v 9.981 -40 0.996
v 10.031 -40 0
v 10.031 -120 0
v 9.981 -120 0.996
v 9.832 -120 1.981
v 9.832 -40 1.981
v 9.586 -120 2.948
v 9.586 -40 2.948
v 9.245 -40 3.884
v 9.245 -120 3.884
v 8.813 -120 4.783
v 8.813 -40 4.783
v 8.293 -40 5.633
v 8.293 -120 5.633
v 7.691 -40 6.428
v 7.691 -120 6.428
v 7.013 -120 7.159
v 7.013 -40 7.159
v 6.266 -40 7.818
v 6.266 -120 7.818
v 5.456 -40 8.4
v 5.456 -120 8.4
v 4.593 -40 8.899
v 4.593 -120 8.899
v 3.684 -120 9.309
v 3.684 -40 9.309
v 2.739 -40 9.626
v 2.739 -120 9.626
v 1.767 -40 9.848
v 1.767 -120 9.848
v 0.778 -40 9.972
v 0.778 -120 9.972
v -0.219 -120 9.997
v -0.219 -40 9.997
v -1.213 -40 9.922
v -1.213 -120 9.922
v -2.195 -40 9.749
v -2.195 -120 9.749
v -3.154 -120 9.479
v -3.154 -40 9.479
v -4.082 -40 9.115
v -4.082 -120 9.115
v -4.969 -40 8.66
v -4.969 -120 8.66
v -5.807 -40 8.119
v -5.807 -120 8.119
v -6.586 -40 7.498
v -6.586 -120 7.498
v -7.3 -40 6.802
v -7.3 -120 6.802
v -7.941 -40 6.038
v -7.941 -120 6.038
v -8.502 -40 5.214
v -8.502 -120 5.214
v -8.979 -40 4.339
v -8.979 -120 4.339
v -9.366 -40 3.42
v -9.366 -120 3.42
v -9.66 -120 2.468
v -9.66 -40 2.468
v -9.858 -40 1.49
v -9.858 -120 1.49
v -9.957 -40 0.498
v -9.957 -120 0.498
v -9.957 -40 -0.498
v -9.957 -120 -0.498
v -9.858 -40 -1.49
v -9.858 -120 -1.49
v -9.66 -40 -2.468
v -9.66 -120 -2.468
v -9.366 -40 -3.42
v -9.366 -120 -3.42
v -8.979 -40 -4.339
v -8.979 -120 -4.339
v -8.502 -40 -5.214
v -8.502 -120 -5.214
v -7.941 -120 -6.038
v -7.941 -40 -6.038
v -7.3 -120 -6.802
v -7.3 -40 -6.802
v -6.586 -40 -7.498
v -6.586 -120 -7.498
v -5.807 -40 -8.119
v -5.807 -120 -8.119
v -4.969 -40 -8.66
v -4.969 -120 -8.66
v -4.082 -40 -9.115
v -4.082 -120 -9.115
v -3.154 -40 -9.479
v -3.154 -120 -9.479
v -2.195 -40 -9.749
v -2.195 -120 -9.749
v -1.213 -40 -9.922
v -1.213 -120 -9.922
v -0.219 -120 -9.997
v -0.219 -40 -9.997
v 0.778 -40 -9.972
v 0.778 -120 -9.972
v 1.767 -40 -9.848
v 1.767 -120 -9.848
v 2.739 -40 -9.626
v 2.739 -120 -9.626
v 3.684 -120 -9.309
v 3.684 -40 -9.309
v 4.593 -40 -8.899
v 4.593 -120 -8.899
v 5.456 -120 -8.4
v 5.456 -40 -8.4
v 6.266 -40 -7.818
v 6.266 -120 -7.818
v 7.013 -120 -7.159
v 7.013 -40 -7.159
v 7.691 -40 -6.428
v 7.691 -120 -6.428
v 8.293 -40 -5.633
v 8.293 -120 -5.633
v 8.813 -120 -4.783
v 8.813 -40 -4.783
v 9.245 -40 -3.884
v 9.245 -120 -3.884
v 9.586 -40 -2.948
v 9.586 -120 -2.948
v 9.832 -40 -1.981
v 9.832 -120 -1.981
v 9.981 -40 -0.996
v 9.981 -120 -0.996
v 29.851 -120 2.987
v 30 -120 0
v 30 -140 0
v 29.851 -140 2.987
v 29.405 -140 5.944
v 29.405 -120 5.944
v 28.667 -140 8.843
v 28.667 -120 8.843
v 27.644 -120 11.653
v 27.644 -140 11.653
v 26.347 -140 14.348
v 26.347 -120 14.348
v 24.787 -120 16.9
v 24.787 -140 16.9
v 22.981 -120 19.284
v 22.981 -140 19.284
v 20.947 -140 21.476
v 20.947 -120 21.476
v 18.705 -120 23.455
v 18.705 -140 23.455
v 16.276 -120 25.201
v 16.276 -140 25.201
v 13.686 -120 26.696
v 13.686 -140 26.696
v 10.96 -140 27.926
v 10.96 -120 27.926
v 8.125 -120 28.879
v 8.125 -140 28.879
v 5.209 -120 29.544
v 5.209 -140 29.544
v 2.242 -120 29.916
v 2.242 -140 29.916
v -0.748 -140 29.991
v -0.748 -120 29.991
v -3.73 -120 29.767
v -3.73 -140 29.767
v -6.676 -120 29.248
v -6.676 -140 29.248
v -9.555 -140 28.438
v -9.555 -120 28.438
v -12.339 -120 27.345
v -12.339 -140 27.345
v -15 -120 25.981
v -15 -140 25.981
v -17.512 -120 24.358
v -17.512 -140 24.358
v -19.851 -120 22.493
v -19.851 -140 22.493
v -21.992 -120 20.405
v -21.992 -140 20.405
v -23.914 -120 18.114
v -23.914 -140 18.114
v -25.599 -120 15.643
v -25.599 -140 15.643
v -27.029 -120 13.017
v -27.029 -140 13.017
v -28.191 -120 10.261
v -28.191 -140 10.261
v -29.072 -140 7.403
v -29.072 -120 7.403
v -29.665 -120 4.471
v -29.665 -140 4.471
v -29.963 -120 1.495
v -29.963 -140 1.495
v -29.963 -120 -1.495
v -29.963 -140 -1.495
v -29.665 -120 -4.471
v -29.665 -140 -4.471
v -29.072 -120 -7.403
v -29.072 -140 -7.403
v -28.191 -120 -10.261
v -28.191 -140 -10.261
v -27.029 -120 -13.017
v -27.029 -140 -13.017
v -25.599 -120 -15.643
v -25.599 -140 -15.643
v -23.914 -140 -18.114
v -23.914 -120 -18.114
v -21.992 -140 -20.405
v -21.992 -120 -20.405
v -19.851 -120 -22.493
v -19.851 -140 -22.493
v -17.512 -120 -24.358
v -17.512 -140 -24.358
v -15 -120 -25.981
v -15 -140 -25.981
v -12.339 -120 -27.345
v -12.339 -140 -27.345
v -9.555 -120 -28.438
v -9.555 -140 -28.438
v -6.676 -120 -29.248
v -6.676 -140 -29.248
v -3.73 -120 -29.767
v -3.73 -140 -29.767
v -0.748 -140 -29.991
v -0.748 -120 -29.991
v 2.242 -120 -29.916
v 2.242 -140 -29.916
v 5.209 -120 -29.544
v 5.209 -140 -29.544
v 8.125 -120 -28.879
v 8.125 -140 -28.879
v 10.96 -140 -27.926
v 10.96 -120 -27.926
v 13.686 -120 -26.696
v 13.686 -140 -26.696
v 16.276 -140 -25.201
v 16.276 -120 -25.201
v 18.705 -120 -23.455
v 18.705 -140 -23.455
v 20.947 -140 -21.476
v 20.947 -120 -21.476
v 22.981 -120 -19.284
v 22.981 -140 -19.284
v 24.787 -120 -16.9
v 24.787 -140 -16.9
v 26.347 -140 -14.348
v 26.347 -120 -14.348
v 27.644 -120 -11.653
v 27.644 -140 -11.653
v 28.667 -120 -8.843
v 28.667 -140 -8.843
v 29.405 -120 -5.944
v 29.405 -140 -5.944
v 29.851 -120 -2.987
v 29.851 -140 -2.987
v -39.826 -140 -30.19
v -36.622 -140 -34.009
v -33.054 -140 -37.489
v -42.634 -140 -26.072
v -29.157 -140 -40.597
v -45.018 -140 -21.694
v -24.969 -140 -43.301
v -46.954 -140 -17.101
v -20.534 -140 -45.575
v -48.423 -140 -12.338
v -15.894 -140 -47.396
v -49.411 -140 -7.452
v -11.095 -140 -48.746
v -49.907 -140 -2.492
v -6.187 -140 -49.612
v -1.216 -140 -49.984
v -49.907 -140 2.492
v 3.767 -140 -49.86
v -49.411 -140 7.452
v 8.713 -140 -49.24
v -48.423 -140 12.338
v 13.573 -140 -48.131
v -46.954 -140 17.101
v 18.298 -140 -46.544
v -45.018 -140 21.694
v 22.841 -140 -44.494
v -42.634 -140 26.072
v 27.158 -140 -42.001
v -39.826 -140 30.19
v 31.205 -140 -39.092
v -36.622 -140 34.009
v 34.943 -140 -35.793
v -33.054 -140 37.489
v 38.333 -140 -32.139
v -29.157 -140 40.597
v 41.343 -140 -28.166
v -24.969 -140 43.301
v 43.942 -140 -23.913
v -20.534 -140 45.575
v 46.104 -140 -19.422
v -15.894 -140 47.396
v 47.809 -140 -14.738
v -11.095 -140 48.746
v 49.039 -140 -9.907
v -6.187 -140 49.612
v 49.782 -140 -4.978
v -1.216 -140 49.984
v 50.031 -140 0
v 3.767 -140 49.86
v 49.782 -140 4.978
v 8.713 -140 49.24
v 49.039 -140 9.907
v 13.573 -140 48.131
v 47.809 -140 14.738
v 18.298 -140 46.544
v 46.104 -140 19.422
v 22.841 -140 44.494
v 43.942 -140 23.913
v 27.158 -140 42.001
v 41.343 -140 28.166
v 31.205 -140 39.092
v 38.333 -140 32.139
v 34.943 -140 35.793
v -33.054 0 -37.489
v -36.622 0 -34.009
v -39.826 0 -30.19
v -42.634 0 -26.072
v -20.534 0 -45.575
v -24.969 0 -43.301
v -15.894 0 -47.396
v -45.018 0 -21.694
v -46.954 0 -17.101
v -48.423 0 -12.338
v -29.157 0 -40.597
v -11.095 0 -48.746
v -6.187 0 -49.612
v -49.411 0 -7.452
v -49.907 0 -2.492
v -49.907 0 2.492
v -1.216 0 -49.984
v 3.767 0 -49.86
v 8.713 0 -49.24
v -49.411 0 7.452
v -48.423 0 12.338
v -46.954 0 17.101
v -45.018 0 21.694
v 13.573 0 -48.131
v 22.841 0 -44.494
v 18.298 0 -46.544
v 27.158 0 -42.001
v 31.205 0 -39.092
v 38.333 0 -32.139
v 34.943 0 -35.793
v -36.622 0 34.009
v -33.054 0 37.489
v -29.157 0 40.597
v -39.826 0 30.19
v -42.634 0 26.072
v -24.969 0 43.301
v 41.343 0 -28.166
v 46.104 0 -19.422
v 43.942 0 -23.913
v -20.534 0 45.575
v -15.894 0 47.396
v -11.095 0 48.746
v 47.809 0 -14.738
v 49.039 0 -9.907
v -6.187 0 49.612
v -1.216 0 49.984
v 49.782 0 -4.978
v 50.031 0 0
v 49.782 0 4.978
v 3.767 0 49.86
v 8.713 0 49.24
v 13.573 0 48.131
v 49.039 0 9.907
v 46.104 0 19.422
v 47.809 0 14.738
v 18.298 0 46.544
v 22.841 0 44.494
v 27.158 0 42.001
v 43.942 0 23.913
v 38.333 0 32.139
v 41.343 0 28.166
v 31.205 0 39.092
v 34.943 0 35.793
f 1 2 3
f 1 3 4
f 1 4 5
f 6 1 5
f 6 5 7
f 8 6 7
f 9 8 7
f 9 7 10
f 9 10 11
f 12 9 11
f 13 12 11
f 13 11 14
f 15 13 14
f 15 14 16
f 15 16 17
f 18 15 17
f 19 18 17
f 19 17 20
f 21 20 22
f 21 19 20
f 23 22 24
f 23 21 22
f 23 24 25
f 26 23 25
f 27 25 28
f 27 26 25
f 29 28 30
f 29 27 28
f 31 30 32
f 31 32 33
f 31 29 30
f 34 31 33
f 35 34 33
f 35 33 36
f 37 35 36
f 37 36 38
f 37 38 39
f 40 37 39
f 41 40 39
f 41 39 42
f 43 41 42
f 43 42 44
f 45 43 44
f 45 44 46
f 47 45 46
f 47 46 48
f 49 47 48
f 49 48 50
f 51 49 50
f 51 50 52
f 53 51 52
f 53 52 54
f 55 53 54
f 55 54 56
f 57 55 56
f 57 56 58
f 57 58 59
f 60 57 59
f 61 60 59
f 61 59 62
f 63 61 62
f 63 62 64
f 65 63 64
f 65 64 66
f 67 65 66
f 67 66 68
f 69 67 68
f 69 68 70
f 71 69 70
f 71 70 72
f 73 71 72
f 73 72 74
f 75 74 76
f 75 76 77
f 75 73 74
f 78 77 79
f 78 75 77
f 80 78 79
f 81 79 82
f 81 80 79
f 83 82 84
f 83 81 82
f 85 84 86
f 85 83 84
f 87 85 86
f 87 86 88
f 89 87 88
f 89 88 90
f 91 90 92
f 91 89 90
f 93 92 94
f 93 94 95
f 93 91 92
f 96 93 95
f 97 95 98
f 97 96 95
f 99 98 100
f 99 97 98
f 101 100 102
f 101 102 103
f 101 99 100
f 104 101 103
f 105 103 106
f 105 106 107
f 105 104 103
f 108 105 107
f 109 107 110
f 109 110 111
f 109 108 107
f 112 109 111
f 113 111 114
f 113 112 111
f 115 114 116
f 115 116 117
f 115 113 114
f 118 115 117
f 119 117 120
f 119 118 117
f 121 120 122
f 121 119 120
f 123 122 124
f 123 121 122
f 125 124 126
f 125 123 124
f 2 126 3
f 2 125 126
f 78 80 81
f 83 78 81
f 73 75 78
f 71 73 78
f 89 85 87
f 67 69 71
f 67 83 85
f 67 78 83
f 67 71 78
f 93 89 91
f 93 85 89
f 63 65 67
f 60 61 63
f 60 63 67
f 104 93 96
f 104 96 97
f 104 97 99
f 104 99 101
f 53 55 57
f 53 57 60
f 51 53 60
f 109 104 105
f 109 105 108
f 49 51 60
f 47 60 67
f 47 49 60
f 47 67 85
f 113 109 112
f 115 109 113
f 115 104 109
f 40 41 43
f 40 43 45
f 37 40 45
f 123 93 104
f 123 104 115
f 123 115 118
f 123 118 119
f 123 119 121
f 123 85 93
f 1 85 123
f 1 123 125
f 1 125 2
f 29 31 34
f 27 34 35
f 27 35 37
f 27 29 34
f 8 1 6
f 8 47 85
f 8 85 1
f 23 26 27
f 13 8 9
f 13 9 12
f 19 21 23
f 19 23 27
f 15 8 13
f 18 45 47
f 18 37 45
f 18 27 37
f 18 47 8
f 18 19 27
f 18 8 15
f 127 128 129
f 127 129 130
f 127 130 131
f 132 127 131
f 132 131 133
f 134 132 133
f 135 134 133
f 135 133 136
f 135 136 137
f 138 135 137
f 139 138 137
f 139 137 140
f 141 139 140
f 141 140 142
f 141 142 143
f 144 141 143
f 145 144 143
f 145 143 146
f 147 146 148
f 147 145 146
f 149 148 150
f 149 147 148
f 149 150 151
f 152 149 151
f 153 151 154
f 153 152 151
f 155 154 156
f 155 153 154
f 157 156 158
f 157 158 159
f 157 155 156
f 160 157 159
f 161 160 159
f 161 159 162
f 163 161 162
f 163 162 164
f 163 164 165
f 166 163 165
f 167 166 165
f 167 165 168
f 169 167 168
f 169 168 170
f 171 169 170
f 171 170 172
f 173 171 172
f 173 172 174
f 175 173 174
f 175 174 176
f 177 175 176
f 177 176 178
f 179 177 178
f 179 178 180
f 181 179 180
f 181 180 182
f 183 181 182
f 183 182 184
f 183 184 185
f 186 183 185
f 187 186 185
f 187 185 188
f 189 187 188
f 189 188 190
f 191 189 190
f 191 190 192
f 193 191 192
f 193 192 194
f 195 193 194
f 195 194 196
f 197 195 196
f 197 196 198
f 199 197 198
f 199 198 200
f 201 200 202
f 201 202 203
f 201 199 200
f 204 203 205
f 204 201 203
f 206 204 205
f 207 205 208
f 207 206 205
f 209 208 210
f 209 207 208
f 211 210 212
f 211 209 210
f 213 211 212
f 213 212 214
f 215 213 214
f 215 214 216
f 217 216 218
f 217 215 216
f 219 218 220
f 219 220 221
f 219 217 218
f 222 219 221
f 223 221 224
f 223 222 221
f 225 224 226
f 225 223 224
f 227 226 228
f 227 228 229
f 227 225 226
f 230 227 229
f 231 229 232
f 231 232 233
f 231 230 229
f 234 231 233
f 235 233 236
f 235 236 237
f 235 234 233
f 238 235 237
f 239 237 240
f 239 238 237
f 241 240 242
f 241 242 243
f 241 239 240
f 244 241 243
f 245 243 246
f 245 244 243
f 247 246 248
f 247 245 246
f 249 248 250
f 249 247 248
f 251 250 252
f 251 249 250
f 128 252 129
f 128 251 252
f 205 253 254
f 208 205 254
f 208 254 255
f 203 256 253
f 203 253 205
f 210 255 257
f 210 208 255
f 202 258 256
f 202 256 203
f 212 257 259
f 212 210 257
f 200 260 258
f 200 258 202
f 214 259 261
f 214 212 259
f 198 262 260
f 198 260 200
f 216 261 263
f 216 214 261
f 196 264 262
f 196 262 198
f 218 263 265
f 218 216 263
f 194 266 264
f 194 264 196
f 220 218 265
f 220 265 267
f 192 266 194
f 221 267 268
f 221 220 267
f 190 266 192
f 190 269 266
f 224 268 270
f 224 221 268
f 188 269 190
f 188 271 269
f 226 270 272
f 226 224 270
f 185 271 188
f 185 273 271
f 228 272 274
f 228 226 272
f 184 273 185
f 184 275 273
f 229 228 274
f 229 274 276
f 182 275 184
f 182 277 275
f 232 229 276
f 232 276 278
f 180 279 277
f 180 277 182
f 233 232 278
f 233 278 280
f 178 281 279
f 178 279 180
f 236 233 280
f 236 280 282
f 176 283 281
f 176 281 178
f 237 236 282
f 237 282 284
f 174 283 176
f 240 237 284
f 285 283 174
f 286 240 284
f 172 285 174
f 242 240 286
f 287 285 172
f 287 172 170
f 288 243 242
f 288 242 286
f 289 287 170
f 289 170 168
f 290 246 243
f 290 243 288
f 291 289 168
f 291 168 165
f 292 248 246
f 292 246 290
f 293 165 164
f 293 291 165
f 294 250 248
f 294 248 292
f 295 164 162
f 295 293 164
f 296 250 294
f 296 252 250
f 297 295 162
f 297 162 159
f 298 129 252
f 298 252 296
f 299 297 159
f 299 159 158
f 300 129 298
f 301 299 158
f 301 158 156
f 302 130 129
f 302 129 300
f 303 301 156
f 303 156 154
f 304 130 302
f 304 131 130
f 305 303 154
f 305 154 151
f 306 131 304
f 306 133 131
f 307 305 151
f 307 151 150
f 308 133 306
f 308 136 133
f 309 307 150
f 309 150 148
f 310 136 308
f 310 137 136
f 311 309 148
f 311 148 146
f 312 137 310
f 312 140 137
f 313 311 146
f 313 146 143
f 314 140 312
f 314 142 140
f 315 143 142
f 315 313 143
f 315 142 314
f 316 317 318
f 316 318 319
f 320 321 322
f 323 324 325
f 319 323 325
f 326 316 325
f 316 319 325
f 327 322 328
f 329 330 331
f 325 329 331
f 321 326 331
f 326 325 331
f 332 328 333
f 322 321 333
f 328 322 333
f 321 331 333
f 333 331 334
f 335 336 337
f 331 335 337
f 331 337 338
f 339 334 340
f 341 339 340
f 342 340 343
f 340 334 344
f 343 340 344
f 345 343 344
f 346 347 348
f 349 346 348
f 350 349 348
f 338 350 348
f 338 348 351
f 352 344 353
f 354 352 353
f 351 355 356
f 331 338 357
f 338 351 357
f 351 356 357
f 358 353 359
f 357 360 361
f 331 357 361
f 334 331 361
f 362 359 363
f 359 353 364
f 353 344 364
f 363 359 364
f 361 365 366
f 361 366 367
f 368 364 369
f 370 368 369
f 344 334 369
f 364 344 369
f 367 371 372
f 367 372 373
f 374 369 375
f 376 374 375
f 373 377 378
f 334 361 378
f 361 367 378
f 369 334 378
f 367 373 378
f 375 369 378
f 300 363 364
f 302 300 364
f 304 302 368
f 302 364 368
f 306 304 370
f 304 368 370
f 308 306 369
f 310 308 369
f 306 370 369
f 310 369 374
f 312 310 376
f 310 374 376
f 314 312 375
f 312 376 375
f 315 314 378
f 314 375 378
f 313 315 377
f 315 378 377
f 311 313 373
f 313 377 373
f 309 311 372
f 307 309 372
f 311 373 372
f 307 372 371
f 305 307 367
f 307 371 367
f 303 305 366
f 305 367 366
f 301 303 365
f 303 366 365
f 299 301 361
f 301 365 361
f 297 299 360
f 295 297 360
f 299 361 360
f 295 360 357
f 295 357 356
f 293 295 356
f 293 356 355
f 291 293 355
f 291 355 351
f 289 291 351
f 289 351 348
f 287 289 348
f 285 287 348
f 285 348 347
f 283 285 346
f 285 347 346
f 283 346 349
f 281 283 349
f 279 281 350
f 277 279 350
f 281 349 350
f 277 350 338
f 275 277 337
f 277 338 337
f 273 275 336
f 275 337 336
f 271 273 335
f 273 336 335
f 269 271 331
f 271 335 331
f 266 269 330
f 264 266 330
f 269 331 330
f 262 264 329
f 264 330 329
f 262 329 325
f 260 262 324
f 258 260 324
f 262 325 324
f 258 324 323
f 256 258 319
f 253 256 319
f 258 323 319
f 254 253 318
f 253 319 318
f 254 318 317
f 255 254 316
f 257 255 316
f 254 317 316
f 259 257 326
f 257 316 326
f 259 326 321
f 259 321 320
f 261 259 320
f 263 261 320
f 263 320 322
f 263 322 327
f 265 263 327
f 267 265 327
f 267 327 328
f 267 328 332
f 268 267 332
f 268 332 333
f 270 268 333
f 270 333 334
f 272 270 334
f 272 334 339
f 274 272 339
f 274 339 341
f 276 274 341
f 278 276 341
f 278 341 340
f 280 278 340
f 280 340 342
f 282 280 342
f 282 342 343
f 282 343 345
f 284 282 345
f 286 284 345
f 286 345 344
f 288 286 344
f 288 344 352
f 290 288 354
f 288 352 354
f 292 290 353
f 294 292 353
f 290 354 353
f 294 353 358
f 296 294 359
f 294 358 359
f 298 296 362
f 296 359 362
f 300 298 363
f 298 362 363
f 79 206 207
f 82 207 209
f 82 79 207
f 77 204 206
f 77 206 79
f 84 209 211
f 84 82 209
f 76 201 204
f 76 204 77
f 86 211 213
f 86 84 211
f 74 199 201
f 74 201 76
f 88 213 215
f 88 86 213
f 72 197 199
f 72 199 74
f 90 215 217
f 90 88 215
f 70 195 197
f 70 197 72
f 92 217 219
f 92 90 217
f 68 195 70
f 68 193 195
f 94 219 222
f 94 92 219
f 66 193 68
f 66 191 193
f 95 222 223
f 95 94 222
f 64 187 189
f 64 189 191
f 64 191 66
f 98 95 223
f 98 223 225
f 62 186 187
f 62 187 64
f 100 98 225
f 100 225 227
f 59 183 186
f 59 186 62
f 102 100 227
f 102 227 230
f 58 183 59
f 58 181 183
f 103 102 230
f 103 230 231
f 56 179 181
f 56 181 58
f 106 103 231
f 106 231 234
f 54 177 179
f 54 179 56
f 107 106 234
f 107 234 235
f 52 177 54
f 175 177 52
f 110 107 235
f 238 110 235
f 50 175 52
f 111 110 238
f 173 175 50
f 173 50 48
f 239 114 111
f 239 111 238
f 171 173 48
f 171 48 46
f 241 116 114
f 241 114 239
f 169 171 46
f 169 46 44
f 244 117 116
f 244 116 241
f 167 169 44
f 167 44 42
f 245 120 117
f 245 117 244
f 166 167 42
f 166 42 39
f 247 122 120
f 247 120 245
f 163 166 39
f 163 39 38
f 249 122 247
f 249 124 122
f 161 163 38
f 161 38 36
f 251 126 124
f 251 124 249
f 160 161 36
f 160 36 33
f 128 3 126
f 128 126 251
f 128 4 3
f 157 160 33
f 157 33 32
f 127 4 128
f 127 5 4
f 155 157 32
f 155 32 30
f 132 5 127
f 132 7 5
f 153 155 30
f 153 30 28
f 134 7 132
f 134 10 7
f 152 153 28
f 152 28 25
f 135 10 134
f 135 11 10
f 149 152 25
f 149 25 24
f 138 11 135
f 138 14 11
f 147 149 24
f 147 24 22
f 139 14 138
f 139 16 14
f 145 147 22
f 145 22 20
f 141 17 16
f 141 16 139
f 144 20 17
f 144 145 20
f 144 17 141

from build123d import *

# Parameters (mm, degrees)
F0_R     = 10
F1_DEPTH = 40
F0_R_2   = 30
F2_DEPTH = 120
F0_R_3   = 50
F3_DEPTH = 140


with BuildPart() as f1:
    # F0 (on Front) → F1 (new body)
    with BuildSketch(Plane.XZ):
        with Locations((0.03067, 0)):
            Circle(F0_R)
    extrude(amount=F1_DEPTH)

    # F0 (on Front) → F2 (join)
    with BuildSketch(Plane.XZ):
        Circle(F0_R_2)
        with Locations((0.03067, 0)):
            Circle(F0_R, mode=Mode.SUBTRACT)
    extrude(amount=F2_DEPTH)

    # F0 (on Front) → F3 (join)
    with BuildSketch(Plane.XZ):
        with Locations((0.03067, 0)):
            Circle(F0_R_3)
        Circle(F0_R_2, mode=Mode.SUBTRACT)
    extrude(amount=F3_DEPTH)


solid = f1.part
